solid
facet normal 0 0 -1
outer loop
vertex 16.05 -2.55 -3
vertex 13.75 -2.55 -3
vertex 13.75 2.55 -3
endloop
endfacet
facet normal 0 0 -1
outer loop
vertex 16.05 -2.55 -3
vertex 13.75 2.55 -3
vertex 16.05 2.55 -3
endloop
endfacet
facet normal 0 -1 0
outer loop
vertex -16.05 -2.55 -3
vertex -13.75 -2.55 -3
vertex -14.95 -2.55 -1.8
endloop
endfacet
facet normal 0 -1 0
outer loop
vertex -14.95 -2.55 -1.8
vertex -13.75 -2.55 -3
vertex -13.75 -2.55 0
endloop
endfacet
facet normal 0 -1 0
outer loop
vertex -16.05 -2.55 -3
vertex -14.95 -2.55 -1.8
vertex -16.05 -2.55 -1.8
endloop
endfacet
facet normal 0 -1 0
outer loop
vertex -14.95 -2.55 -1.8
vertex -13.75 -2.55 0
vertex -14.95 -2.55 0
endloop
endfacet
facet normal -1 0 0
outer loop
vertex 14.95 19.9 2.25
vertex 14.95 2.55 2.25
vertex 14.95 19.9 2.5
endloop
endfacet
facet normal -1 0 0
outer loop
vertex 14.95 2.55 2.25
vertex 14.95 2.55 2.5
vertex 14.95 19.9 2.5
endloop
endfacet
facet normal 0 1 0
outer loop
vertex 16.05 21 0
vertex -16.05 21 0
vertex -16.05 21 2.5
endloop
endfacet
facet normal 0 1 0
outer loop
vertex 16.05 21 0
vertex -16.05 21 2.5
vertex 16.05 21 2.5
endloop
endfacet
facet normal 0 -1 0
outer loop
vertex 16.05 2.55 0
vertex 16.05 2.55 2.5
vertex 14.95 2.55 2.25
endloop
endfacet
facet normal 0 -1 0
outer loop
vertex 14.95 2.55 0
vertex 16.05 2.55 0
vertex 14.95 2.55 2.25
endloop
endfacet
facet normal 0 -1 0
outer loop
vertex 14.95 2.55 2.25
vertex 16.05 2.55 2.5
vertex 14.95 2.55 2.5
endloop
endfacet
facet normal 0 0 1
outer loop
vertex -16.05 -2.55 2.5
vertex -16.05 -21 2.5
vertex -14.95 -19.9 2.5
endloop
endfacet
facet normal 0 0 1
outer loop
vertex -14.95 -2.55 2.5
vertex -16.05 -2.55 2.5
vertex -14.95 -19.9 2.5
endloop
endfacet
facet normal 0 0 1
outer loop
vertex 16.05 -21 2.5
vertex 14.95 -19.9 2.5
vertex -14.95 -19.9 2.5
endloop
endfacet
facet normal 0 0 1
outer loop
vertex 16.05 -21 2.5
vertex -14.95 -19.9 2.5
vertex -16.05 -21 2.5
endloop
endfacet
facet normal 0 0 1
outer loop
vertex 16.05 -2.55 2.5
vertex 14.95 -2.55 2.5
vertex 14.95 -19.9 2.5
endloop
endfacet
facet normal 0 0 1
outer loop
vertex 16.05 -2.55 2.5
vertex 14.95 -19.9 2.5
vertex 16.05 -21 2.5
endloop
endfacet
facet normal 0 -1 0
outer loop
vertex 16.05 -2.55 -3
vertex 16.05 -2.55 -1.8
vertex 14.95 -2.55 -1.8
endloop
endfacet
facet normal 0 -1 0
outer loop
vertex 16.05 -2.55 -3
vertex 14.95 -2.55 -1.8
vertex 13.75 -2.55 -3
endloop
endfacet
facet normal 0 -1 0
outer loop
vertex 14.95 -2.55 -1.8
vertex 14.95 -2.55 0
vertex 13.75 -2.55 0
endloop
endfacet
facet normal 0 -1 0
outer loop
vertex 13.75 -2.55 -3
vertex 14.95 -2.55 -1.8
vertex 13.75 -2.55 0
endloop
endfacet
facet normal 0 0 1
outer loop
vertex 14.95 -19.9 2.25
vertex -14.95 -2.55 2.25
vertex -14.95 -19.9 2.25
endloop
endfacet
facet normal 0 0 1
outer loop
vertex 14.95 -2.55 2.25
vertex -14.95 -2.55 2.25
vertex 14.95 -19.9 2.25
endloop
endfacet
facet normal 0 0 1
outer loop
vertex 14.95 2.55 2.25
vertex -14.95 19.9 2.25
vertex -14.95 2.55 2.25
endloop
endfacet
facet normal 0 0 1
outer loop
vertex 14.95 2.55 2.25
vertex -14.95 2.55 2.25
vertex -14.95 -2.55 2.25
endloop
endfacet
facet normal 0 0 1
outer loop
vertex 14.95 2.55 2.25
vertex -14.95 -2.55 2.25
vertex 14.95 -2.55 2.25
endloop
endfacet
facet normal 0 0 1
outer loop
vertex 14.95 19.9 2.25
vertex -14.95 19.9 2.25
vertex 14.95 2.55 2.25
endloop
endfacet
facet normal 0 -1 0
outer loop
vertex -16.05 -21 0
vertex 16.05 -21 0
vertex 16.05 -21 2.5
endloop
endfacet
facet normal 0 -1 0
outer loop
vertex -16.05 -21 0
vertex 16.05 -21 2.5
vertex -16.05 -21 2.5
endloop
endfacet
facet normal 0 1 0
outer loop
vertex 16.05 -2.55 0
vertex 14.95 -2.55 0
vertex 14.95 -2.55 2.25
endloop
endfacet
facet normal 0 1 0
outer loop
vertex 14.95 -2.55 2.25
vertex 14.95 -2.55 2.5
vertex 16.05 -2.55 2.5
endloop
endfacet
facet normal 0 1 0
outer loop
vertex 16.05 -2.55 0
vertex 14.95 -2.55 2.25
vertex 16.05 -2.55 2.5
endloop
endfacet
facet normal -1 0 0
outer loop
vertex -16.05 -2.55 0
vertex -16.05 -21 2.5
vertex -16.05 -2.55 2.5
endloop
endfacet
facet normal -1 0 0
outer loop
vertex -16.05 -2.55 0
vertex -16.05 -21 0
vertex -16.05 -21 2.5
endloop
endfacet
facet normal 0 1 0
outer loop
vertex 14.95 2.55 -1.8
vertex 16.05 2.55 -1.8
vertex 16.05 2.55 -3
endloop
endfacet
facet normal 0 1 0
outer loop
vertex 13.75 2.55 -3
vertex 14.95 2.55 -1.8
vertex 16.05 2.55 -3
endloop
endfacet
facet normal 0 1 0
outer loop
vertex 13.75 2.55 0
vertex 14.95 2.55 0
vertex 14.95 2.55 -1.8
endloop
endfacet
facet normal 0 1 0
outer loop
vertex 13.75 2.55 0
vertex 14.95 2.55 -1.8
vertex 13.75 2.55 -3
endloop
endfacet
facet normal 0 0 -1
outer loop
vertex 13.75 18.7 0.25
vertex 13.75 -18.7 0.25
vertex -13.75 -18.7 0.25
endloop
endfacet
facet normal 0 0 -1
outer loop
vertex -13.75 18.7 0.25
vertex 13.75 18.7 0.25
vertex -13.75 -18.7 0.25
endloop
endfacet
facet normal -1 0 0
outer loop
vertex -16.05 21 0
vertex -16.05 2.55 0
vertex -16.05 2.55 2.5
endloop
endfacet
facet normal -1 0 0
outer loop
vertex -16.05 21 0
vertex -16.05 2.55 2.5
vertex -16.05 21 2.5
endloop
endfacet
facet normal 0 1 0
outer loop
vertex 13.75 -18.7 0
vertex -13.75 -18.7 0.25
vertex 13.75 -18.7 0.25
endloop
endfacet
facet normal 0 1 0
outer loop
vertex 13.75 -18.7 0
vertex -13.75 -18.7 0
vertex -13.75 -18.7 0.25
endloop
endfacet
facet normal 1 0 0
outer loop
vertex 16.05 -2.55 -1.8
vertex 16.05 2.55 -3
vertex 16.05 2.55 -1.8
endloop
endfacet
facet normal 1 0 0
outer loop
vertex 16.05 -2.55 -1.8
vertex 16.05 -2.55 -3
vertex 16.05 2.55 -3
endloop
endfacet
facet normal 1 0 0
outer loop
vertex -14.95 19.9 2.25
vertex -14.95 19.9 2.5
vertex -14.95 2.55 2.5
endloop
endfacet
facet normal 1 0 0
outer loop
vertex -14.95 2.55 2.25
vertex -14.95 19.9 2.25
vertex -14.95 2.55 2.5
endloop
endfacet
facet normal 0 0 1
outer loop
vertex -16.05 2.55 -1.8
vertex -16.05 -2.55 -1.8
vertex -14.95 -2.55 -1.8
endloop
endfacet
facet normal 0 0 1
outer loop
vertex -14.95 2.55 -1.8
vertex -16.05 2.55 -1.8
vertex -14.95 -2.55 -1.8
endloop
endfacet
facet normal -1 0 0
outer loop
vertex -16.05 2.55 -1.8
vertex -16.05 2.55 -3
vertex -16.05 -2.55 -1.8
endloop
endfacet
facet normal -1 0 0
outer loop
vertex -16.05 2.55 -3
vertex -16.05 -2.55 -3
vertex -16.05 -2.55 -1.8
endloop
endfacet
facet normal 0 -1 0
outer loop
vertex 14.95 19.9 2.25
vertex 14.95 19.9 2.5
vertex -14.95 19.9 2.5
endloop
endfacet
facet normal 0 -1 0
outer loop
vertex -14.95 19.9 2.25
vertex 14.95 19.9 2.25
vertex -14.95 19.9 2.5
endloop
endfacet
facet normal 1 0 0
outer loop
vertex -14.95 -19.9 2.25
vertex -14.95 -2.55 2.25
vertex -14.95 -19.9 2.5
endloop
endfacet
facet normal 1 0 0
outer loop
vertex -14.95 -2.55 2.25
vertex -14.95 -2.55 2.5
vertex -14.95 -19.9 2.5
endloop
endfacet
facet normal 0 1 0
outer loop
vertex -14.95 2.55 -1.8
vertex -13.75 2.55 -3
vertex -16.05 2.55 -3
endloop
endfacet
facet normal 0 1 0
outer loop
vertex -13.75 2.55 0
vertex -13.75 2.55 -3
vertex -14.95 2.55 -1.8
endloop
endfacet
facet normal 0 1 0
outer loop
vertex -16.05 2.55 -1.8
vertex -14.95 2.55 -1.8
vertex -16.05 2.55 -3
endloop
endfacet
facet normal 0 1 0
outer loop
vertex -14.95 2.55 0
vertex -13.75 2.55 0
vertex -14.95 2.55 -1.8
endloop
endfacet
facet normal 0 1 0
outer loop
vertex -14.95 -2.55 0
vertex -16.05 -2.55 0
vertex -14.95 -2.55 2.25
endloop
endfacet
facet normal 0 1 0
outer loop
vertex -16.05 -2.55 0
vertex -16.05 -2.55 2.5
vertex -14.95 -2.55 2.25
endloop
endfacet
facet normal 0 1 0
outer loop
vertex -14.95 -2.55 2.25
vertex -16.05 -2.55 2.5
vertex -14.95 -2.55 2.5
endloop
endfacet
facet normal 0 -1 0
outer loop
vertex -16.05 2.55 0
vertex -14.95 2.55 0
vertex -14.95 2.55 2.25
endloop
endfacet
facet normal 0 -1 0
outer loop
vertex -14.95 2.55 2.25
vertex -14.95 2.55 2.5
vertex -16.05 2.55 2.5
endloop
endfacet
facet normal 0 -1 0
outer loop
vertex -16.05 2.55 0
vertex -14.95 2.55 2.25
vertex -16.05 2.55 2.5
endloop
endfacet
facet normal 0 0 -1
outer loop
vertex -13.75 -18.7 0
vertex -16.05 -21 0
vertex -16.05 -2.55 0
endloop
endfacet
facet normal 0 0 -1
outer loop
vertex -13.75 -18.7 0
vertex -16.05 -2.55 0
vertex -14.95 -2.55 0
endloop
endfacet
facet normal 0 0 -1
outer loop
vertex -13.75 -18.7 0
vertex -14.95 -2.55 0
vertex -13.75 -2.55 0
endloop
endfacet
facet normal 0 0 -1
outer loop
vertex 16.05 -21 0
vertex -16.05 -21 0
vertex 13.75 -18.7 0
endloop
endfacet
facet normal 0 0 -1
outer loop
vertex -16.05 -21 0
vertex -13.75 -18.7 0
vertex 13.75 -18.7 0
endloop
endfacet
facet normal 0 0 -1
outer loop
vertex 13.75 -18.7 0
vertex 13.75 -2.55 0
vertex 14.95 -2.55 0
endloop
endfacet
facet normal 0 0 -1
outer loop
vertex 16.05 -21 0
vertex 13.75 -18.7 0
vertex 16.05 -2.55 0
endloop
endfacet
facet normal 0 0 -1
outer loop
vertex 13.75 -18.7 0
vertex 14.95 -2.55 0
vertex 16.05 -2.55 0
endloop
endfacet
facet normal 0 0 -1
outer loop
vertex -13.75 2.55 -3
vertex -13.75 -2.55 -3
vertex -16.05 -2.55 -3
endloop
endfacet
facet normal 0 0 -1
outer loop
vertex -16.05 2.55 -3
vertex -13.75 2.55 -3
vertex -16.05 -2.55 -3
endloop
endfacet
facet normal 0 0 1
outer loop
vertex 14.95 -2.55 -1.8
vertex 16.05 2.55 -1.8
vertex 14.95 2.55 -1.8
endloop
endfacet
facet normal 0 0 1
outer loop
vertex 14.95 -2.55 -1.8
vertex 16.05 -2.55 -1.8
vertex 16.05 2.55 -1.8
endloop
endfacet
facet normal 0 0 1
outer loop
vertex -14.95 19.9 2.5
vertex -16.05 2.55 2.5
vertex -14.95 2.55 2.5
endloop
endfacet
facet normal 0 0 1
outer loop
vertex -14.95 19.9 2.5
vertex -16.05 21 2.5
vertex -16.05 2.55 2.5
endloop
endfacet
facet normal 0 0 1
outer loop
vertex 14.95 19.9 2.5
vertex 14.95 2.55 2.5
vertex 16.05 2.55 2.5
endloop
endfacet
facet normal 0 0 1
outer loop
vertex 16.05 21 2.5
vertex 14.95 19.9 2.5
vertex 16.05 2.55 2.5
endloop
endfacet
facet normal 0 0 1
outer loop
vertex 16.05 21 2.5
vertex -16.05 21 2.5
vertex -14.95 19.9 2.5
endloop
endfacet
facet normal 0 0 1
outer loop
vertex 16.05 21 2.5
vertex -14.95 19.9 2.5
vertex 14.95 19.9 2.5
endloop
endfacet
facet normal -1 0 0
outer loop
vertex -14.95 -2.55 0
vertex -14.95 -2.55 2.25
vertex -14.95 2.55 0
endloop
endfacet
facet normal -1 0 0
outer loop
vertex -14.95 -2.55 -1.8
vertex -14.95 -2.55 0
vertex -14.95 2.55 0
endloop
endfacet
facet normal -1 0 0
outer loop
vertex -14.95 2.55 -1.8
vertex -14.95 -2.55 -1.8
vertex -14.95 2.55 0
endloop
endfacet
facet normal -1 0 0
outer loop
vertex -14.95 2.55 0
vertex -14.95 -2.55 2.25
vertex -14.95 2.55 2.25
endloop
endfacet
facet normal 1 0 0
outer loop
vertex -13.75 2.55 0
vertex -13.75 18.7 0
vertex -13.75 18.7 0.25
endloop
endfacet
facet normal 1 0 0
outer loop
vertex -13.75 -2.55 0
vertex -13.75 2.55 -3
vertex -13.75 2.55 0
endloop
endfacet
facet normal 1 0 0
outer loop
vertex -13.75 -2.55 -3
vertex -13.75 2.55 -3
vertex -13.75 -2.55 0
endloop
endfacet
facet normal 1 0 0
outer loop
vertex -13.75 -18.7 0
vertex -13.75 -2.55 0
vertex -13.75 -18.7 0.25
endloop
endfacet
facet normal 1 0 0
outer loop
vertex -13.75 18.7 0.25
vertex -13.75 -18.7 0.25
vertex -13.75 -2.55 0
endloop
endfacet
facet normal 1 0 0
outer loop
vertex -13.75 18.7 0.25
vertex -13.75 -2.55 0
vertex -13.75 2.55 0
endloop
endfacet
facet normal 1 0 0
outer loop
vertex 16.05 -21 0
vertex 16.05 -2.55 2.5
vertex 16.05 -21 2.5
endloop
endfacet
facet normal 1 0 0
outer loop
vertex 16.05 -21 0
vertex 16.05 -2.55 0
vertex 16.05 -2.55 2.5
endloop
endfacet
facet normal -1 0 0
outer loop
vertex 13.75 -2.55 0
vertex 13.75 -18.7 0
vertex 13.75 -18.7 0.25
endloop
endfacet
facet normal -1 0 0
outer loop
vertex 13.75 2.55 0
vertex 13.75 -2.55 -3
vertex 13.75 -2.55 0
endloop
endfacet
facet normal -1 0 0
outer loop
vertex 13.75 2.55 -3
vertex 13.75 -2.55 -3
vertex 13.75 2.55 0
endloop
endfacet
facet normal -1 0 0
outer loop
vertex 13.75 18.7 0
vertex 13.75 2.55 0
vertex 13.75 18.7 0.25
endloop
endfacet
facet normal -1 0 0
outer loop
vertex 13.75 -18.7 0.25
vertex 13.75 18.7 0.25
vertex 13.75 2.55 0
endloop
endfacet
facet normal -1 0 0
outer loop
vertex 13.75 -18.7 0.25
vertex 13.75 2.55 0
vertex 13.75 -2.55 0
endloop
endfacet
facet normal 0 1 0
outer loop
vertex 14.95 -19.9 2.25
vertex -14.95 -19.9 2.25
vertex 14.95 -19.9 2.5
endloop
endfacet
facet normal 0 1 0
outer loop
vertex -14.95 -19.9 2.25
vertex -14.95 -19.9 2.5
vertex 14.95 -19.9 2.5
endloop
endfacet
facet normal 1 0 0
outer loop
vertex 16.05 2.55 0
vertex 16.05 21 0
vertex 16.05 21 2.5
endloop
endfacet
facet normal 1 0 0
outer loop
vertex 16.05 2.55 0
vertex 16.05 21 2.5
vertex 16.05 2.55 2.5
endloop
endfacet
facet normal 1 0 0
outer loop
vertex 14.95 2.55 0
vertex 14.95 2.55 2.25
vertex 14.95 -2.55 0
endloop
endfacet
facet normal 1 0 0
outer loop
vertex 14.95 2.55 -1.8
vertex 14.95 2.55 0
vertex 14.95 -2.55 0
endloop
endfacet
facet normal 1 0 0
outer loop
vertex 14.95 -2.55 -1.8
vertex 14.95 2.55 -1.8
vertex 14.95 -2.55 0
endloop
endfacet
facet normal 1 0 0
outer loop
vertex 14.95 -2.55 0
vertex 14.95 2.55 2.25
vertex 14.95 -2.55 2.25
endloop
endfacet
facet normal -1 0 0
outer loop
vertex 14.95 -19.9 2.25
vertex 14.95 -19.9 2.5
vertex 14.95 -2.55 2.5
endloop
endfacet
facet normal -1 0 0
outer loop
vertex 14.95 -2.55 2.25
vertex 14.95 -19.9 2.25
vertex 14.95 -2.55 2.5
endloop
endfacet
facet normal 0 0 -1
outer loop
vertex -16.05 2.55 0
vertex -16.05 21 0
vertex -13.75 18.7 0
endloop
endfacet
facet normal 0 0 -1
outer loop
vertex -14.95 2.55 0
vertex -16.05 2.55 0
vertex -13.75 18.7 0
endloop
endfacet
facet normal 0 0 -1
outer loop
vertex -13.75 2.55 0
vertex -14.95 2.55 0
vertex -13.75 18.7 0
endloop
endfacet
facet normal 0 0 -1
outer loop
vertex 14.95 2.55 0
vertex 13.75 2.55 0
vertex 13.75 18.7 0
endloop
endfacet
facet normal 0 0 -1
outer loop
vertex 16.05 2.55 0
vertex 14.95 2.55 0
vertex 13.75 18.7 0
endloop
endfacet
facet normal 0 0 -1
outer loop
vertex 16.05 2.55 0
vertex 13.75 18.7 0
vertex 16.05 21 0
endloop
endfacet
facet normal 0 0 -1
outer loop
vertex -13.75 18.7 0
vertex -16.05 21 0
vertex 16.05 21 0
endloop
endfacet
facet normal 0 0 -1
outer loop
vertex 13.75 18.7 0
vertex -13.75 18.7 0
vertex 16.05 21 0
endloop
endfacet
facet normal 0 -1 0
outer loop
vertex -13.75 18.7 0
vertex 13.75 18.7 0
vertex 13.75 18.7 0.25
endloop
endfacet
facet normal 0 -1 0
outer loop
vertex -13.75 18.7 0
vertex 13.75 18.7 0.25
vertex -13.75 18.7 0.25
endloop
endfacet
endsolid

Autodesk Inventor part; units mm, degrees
ref_plane "YZ Plane" through (0, 0, 0) normal (1, 0, 0) x (0, 1, 0)
ref_plane "XZ Plane" through (0, 0, 0) normal (0, 1, 0) x (-1, 0, 0)
ref_plane "XY Plane" through (0, 0, 0) normal (0, 0, 1) x (1, 0, 0)
sketch "Эскиз1" plane through (0, 0, 0) normal (0, 0, 1) x (1, 0, 0)
  line L0 (-16.05, 21) -> (16.05, 21)
  line L1 (16.05, 21) -> (16.05, -21)
  line L2 (16.05, -21) -> (-16.05, -21)
  line L3 (-16.05, -21) -> (-16.05, 21)
  point P0 (0, 0)
  point P1 (0, 21)
  point P2 (16.05, 0)
  dimension "d0" = 32.1
  dimension "d1" = 42
extrude "Выдавливание1" add sketch "Эскиз1" along normal blind 2.5
sketch "Эскиз2" plane through (0, 0, 0) normal (0, 1, 0) x (-1, 0, 0)
  line L0 (16.05, 0) -> (-16.05, 0) construction
  line L1 (16.05, 0) -> (16.05, 2.5) construction
  line L2 (-16.05, 2.5) -> (16.05, 2.5) construction
  line L3 (-16.05, 0) -> (-16.05, 2.5) construction
  line L4 (-13.75, 0) -> (-13.75, -3)
  line L5 (-13.75, -3) -> (-16.05, -3)
  line L6 (-16.05, -3) -> (-16.05, -1.8)
  line L7 (-16.05, -1.8) -> (-14.95, -1.8)
  line L8 (-14.95, -1.8) -> (-14.95, 0)
  line L9 (-14.95, 0) -> (-13.75, 0)
  line L10 (13.75, 0) -> (13.75, -3)
  line L11 (13.75, -3) -> (16.05, -3)
  line L12 (16.05, -3) -> (16.05, -1.8)
  line L13 (16.05, -1.8) -> (14.95, -1.8)
  line L14 (14.95, -1.8) -> (14.95, 0)
  line L15 (14.95, 0) -> (13.75, 0)
  point P0 (0, 0)
  dimension "d4" = 2.3
  dimension "d5" = 1.2
  dimension "d6" = 5.5
extrude "Выдавливание2" add sketch "Эскиз2" along normal mid plane 5.1
sketch "Эскиз3" plane through (0, 0, 2.5) normal (0, 0, 1) x (1, 0, 0)
  line L0 (17.05, 2.55) -> (14.95, 2.55)
  line L1 (14.95, 2.55) -> (14.95, -2.55)
  line L2 (14.95, -2.55) -> (17.05, -2.55)
  line L3 (17.05, -2.55) -> (17.05, 2.55)
  line L4 (-14.95, 2.55) -> (-17.05, 2.55)
  line L5 (-17.05, 2.55) -> (-17.05, -2.55)
  line L6 (-17.05, -2.55) -> (-14.95, -2.55)
  line L7 (-14.95, -2.55) -> (-14.95, 2.55)
  line L8 (-16.05, 21) -> (-16.05, -21) construction
  line L9 (16.05, -21) -> (16.05, 21) construction
  line L10 (16.05, -2.55) -> (16.05, 2.55) construction
  line L11 (14.95, 2.55) -> (16.05, 2.55) construction
  line L12 (14.95, -2.55) -> (14.95, 2.55) construction
  line L13 (16.05, -2.55) -> (14.95, -2.55) construction
  line L14 (-14.95, 2.55) -> (-14.95, -2.55) construction
  line L15 (-16.05, 2.55) -> (-14.95, 2.55) construction
  line L16 (-16.05, 2.55) -> (-16.05, -2.55) construction
  line L17 (-14.95, -2.55) -> (-16.05, -2.55) construction
  point P0 (0, 0)
  dimension "d9" = 1
  dimension "d10" = 1
extrude "Выдавливание3" cut sketch "Эскиз3" against normal up to surface (4.3 mm away)
sketch "Эскиз4" plane through (0, 0, 0) normal (0, 0, -1) x (-1, 0, 0)
  line L0 (13.75, -18.7) -> (-13.75, -18.7)
  line L1 (-13.75, -18.7) -> (-13.75, 18.7)
  line L2 (-13.75, 18.7) -> (13.75, 18.7)
  line L3 (13.75, 18.7) -> (13.75, -18.7)
  line L4 (-16.05, -21) -> (16.05, -21) construction
  line L5 (16.05, 21) -> (-16.05, 21) construction
  line L6 (13.75, -2.55) -> (13.75, 2.55) construction
  line L7 (-13.75, 2.55) -> (-13.75, -2.55) construction
  line L8 (16.05, -2.55) -> (16.05, -21) construction
  point P0 (0, 0)
  dimension "d13" = 2.3
  dimension "d14" = 2.3
  dimension "d15" = 2.3
extrude "Выдавливание4" cut sketch "Эскиз4" against normal blind 0.25
sketch "Эскиз5" plane through (0, 0, 2.5) normal (0, 0, 1) x (1, 0, 0)
  line L0 (14.95, 19.9) -> (-14.95, 19.9)
  line L1 (-14.95, 19.9) -> (-14.95, -19.9)
  line L2 (-14.95, -19.9) -> (14.95, -19.9)
  line L3 (14.95, -19.9) -> (14.95, 19.9)
  line L4 (14.95, -2.55) -> (14.95, 2.55) construction
  line L5 (-14.95, 2.55) -> (-14.95, -2.55) construction
  line L6 (16.05, 2.55) -> (16.05, 21) construction
  line L7 (16.05, 21) -> (-16.05, 21) construction
  line L8 (-16.05, -21) -> (16.05, -21) construction
  point P0 (0, 0)
  dimension "d18" = 1.1
  dimension "d19" = 1.1
  dimension "d20" = 1.1
extrude "Выдавливание5" cut sketch "Эскиз5" against normal blind 0.25
equation "\"d14\" = d13"
equation "\"d15\" = d13"
equation "\"d19\" = d18"
equation "\"d20\" = d18"
properties part number "D2MG cover"
